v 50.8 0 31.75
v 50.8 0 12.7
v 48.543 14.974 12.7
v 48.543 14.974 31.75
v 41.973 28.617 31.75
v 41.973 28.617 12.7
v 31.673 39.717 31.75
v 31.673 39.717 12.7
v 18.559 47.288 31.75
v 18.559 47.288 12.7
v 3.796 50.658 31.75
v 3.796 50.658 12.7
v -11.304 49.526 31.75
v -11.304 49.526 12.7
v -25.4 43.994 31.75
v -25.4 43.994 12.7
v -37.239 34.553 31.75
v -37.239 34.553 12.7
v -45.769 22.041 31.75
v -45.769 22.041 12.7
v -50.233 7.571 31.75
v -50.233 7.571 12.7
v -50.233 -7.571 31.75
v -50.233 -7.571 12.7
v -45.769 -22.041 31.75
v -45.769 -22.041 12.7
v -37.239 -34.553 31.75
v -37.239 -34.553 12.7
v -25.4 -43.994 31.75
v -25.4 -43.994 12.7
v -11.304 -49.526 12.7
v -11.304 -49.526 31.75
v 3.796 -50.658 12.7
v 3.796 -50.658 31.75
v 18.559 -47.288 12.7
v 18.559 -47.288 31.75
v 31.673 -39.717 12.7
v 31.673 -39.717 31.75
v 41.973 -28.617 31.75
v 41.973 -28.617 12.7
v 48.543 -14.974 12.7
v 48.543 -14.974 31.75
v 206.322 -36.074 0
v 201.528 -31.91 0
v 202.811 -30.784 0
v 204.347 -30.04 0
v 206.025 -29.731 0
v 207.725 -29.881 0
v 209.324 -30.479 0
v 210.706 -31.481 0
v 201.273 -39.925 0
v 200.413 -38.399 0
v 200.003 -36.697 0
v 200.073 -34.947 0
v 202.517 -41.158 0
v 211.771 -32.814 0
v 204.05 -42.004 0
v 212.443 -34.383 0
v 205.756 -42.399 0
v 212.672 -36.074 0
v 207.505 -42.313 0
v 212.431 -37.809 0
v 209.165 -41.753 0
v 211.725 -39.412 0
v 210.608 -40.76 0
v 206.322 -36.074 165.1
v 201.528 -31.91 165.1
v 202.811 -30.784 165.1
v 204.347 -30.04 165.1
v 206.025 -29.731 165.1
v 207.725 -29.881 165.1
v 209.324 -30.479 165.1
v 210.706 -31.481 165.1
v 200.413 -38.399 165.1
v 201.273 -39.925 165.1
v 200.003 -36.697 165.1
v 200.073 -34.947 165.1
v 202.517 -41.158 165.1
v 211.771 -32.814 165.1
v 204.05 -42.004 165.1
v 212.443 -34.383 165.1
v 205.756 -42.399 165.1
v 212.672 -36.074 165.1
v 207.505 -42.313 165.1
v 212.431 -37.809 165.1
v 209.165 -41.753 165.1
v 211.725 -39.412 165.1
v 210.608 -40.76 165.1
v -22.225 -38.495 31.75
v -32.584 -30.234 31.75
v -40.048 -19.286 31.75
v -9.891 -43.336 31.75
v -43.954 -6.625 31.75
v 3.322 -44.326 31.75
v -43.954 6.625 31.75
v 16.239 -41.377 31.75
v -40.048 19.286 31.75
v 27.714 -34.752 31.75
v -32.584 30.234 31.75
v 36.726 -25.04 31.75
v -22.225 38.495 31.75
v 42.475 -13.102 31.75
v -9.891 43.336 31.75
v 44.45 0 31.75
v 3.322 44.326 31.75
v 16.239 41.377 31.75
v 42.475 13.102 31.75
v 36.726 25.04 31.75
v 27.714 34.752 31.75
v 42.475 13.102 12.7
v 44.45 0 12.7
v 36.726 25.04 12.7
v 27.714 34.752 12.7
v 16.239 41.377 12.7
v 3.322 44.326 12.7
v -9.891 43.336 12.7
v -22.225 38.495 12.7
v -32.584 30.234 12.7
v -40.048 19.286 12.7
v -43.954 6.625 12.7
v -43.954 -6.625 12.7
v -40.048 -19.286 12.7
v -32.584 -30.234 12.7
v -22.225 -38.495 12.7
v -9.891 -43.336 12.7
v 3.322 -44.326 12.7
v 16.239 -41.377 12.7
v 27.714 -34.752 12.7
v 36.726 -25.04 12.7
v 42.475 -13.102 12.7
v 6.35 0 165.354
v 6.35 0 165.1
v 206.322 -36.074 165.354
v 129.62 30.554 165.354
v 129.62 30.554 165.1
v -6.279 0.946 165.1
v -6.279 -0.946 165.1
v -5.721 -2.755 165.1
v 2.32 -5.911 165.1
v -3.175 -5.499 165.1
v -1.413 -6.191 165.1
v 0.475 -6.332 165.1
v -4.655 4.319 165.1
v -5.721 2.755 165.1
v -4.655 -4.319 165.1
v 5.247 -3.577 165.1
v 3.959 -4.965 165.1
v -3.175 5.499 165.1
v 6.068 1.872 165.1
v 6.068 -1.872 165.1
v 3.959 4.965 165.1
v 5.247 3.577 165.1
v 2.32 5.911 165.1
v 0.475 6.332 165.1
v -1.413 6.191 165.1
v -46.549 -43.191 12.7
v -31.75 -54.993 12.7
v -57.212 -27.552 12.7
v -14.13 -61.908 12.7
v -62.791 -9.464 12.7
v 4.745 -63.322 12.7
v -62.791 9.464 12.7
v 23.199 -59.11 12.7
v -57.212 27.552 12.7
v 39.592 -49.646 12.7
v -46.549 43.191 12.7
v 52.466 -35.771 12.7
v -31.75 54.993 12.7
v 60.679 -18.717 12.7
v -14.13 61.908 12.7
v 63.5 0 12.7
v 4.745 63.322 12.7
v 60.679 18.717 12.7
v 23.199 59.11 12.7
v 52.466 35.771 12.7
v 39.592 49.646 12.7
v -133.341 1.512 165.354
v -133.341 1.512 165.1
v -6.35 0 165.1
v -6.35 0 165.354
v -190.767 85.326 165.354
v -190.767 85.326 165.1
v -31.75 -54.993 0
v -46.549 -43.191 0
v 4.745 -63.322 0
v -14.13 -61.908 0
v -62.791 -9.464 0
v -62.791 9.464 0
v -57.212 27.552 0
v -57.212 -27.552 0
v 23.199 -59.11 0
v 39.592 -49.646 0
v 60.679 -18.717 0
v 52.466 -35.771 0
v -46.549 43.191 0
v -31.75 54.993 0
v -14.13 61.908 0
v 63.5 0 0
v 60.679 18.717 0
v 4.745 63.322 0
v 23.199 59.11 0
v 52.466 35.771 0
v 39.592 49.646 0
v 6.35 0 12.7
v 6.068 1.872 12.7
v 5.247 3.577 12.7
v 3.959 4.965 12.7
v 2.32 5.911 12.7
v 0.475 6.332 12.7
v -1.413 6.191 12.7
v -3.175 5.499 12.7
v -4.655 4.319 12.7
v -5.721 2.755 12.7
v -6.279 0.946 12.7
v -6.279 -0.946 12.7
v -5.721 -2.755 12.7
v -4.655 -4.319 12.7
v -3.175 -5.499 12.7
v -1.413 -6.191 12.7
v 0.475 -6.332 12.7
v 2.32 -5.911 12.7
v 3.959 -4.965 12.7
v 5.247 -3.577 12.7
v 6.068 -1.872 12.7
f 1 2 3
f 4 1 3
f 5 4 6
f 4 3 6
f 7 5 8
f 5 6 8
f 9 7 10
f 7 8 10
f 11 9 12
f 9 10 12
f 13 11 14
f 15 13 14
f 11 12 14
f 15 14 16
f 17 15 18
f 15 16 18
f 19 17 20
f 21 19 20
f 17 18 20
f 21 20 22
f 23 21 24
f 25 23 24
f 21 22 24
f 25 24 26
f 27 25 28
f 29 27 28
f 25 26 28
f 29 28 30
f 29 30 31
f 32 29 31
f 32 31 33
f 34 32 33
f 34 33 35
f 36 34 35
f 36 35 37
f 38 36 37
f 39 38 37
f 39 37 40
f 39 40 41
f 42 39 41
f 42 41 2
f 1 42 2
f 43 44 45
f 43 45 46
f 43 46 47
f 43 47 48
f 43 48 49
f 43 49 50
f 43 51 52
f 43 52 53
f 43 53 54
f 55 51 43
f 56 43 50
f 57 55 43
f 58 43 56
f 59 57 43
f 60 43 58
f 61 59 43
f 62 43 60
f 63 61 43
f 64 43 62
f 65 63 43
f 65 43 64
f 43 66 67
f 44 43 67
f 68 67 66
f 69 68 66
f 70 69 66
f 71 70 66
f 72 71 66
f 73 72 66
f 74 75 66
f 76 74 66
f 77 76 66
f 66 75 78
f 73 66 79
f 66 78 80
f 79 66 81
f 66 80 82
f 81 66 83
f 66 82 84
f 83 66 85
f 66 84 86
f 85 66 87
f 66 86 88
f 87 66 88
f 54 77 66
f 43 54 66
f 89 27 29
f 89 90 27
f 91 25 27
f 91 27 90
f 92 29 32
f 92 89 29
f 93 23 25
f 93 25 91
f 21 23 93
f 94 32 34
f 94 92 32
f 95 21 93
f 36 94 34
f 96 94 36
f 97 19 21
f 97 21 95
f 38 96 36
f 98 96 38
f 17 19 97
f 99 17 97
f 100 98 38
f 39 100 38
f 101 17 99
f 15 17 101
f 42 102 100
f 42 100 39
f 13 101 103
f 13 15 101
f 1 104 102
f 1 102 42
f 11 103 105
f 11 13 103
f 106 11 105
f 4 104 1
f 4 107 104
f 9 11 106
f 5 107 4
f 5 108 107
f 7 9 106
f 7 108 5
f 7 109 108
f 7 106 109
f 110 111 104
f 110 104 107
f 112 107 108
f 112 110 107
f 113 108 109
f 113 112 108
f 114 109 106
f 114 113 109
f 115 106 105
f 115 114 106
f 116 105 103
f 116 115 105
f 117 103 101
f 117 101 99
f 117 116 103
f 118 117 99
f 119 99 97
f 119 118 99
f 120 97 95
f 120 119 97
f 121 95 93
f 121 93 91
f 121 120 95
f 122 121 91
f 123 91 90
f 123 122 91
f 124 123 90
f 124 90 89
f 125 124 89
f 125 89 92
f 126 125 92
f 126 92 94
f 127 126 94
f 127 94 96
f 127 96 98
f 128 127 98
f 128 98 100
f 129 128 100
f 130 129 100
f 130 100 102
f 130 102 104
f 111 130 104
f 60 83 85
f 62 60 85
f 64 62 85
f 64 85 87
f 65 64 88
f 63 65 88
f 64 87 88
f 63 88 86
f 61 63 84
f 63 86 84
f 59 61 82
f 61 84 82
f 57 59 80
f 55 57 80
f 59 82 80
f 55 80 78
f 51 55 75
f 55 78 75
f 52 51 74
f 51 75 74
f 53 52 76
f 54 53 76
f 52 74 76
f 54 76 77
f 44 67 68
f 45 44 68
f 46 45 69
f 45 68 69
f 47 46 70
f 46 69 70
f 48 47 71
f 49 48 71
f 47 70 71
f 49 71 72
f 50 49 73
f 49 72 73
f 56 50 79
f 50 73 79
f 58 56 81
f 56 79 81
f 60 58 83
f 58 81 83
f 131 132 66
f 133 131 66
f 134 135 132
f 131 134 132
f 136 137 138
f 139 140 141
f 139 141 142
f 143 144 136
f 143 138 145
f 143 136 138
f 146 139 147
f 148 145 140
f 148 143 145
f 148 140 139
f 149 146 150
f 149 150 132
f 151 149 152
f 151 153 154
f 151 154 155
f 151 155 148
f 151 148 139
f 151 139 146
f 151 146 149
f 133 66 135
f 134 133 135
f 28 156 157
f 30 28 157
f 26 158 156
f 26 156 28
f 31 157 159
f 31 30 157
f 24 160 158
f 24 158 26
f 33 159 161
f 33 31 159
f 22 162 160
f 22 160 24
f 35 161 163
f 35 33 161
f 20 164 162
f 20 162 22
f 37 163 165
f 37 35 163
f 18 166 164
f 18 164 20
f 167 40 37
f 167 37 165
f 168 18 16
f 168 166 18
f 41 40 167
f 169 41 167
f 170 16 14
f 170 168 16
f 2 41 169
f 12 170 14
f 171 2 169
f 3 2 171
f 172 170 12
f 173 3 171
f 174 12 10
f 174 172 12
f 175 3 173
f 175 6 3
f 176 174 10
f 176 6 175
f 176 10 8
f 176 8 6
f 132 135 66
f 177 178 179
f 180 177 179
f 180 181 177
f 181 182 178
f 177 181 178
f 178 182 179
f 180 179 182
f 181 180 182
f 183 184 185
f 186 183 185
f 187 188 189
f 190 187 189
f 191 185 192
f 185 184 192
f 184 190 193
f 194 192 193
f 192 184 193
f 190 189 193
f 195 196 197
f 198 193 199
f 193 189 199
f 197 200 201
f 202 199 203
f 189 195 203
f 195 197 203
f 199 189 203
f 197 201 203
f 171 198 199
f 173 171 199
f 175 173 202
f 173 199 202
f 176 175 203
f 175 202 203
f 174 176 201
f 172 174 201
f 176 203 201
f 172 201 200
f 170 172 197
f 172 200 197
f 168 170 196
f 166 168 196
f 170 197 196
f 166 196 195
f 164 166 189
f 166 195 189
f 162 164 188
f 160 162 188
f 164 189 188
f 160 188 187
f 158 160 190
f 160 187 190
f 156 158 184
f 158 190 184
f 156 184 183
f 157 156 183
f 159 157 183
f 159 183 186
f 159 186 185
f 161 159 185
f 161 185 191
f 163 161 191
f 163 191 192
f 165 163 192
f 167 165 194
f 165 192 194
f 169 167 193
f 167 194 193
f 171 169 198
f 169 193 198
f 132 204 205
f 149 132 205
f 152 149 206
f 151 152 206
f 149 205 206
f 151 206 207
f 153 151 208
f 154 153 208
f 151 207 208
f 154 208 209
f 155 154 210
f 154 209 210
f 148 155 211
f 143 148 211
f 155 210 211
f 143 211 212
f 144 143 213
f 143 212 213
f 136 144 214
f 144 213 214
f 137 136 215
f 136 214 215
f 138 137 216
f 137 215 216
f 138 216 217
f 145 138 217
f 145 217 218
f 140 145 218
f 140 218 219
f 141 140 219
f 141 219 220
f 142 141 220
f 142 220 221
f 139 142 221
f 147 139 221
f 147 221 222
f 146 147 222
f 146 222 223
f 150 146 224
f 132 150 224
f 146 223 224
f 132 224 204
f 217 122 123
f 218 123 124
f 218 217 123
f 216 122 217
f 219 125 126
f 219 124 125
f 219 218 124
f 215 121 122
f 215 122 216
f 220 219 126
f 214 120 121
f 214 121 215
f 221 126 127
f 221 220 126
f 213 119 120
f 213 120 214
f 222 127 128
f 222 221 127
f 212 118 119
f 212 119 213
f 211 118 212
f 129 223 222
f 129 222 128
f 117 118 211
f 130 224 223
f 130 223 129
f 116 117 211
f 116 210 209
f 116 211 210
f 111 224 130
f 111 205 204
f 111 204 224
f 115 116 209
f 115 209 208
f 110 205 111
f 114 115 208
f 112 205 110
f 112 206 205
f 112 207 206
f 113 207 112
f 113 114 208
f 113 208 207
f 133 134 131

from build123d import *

# Parameters (mm, degrees)
F0_R      = 63.5
F1_DEPTH  = 12.7
F2_R      = 50.8
F2_R_2    = 44.45
F3_DEPTH  = 31.75
F4_R      = 6.35
F5_DEPTH  = 152.4
F7_DEPTH  = 0.254
F9_DEPTH  = 0.254
F13_DEPTH = 165.1


# Not quite as in the source:
# - the program builds the solid bodies; features that only make, move or delete a surface that nothing else refers to are left out


with BuildPart() as f1:
    # F0 (on Top) → F1 (new body)
    with BuildSketch(Plane.XY):
        Circle(F0_R)
    extrude(amount=F1_DEPTH)

    # F2 (on Top) → F3 (join)
    with BuildSketch(Plane.XY):
        Circle(F2_R)
        Circle(F2_R_2, mode=Mode.SUBTRACT)
    extrude(amount=F3_DEPTH)

    # F4 (on face) → F5 (join)
    with BuildSketch(Plane.XY.offset(12.7)):
        Circle(F4_R)
    extrude(amount=F5_DEPTH)


with BuildPart() as f7:
    # F6 (on face) → F7 (new body)
    with BuildSketch(Plane.XY.offset(165.1)):
        Polygon((129.6198948271, 30.5537727509), (6.35, 0), (206.3221851049, -36.0744394879), align=None)
    extrude(amount=F7_DEPTH)


with BuildPart() as f9:
    # F8 (on face) → F9 (new body)
    with BuildSketch(Plane.XY.offset(165.1)):
        Polygon((-133.3409966481, 1.5122071029), (-6.35, 0), (-190.7670811897, 85.3263157853), align=None)
    extrude(amount=F9_DEPTH)


with BuildPart() as f13:
    # F12 (on face) → F13 (new body)
    with BuildSketch(Plane(origin=(0, 0, 165.1), x_dir=(1, 0, 0), z_dir=(0, 0, -1))):
        with BuildLine():
            ThreePointArc((201.5282919625, 31.910176223), (208.5449399886, 30.1261741335), (212.6721851049, 36.0744394879))
            ThreePointArc((212.6721851049, 36.0744394879), (205.7562701297, 42.3991719124), (200.0730543204, 34.9471132539))
            Line((200.0730543204, 34.9471132539), (206.3221851049, 36.0744394879))
            Line((206.3221851049, 36.0744394879), (201.5282919625, 31.910176223))
        make_face()
    extrude(amount=F13_DEPTH)


solid = Compound([f1.part, f7.part, f9.part, f13.part])
